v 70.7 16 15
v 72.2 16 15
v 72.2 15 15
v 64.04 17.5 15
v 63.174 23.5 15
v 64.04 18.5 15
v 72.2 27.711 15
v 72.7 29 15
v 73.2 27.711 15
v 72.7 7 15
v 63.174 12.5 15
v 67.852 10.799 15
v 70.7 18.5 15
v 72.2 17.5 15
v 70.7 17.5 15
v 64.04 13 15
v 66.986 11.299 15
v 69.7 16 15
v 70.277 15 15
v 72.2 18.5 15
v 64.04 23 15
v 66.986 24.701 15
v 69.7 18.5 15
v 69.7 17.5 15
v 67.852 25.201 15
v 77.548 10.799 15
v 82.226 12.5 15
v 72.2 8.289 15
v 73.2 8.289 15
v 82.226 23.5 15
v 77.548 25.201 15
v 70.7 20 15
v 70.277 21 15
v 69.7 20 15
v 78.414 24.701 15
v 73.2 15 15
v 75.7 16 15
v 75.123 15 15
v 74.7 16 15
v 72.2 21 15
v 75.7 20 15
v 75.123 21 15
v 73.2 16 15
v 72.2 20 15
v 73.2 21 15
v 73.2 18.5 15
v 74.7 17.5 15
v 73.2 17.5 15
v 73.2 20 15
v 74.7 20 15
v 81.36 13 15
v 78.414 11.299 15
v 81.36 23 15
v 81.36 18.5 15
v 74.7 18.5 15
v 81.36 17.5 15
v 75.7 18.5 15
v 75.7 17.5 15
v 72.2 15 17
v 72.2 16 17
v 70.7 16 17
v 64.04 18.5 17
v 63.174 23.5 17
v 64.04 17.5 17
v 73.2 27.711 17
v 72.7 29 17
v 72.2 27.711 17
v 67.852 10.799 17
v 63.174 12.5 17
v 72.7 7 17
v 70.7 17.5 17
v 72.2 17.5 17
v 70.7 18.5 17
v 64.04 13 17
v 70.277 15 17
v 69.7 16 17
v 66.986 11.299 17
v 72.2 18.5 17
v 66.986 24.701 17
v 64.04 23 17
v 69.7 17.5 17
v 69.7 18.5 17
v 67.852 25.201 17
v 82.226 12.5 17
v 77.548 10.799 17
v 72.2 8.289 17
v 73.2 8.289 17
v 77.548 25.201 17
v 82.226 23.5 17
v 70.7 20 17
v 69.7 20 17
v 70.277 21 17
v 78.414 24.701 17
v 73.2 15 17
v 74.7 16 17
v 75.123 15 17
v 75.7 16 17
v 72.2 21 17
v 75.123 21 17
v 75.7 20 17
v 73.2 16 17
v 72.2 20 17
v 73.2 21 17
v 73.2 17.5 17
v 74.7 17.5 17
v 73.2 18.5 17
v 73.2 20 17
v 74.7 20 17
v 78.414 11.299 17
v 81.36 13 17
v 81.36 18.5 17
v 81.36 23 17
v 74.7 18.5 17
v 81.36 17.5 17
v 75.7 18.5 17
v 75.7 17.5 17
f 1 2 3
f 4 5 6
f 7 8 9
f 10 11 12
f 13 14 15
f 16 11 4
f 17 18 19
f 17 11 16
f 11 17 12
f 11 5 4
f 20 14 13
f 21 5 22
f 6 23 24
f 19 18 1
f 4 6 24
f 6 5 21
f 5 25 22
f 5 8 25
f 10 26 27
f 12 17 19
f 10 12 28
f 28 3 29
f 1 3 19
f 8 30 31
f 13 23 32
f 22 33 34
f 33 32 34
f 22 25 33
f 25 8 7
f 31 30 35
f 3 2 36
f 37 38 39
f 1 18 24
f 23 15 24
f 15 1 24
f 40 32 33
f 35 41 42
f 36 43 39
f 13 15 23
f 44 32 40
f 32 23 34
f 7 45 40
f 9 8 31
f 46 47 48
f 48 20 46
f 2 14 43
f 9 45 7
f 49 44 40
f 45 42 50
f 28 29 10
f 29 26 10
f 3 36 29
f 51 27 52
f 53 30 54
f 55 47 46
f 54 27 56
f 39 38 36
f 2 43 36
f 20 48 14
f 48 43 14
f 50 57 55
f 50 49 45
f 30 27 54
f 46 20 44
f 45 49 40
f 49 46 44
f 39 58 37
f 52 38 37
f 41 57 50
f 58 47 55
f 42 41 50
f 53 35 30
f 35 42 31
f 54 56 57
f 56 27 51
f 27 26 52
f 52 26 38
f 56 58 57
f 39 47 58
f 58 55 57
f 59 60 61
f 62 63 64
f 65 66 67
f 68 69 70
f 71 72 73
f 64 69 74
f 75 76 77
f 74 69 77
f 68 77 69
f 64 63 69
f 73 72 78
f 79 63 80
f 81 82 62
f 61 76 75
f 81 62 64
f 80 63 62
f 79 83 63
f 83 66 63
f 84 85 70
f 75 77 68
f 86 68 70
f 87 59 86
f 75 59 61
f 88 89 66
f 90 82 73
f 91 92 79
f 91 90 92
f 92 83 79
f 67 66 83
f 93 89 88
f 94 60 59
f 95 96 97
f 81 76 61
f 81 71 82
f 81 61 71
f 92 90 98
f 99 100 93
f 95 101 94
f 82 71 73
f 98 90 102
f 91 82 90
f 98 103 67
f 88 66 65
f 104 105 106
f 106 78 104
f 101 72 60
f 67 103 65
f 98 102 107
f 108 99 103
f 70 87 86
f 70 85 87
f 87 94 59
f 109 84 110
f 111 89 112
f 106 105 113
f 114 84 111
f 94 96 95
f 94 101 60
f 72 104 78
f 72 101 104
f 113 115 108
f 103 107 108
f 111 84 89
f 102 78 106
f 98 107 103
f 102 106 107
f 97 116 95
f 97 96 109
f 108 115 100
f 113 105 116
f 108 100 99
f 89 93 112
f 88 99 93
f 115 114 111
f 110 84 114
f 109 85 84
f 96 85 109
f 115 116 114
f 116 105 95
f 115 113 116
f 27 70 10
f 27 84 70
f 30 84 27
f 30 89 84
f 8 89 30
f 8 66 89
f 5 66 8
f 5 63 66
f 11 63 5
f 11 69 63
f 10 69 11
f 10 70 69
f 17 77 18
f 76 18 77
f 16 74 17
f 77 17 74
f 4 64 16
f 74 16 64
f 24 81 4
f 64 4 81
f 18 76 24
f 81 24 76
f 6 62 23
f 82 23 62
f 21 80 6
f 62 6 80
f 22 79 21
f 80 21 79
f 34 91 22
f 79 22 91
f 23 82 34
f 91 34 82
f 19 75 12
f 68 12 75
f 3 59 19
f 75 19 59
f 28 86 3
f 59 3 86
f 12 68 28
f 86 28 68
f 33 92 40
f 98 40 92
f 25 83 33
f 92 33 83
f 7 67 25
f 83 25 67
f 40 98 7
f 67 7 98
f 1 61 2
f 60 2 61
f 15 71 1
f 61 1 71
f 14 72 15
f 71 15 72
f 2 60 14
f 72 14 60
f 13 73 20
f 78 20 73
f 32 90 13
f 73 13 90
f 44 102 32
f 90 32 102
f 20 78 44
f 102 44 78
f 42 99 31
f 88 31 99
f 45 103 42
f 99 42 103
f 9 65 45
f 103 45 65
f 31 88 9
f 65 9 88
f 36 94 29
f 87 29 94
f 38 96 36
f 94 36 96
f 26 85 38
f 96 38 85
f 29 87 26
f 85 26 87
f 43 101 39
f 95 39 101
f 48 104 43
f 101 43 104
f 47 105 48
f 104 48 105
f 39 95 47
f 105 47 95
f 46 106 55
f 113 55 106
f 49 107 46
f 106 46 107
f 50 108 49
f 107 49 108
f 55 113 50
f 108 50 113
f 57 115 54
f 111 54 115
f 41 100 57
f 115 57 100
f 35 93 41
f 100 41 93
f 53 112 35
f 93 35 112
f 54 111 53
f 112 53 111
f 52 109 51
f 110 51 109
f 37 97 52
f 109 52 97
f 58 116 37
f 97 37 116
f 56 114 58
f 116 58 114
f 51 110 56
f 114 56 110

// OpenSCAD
hex_width = 12;
hex_x_count = 4;
hex_y_count = 4;
hex_wall = 1;
hex_height = 2;

insert_width = hex_width - hex_wall;
insert_line = 1;

led_list_w = 10;

frame_width = 2;
frame_height = hex_height * 4 + led_list_w;



module hex_grid(size, count_x, count_y, wall, solid=false) {
    // Calculate geometric spacing for "Pointy Top" hexagons (rotate(90))
    // Horizontal spacing (flat-to-flat distance): sqrt(3) * radius
    spacing_x = sqrt(3) * size; 
    
    // Vertical spacing (3/2 * radius for nesting)
    spacing_y = size * 1.5; 

    for (x = [0 : count_x], y = [0 : count_y]) {
            // Apply offset: Odd rows shift right by half the X spacing
      if (!((y % 2 == 1) && (x == count_x))) {
            x_pos = (x * spacing_x) + ((y % 2) * (spacing_x / 2));
            y_pos = y * spacing_y;

            translate([x_pos, y_pos, 0])
            rotate(90)
                difference() {
                    // Changed to 'r' syntax for cleaner reading, mathematically identical to your 'd'
                    circle(r = size, $fn = 6);
                    if (!solid) {
                      circle(r = size - wall, $fn = 6);
                    }
                }
      }
    }
}

module hex_frame(size, count_x, count_y, wall) {
    // Calculate geometric spacing for "Pointy Top" hexagons (rotate(90))
    // Horizontal spacing (flat-to-flat distance): sqrt(3) * radius
color("gray")
  linear_extrude(height=frame_height) {
    difference() {
      offset(r=2, chamfer=false) {
        hex_grid(size=size, count_x=count_x, count_y=count_y, wall=wall, solid=true);     
      }
      hex_grid(size=size, count_x=count_x, count_y=count_y, wall=wall, solid=true);
    }
  }
  // top lip
  color("lightgray")
  translate([0,0,frame_height-hex_height]) {
    linear_extrude(height=hex_height) {
      difference() {
        hex_grid(size=size, count_x=count_x, count_y=count_y, wall=wall, solid=true); 
        offset(r=-2, chamfer=false) {
          hex_grid(size=size, count_x=count_x, count_y=count_y, wall=wall, solid=true);   
        }
      }
    }
  }

  // middle lip
  color("lightgray")
  translate([0,0,frame_height-hex_height*3]) {
    linear_extrude(height=hex_height) {
      difference() {
        hex_grid(size=size, count_x=count_x, count_y=count_y, wall=wall, solid=true); 
        offset(r=-1, chamfer=false) {
          hex_grid(size=size, count_x=count_x, count_y=count_y, wall=wall, solid=true);    
        }
      }
    }
  }

  // bottom lip
  color("darkgray")
  translate([0,0,0.0]) {
    linear_extrude(height=hex_height) {
      difference() {
        hex_grid(size=size, count_x=count_x, count_y=count_y, wall=wall, solid=true); 
        offset(r=-5, chamfer=false) {
          hex_grid(size=size, count_x=count_x, count_y=count_y, wall=wall, solid=true);    
        }
      }
    }
  }
}

module hex_insert_frame(size, wall, line) {
  difference() {
    circle(r = size, $fn = 6);
    circle(r = size - wall, $fn = 6);
  }
}

module hex_insert_star(size, wall, line) {
  hex_insert_frame(size=size, wall=wall, line=line);
  difference() {
    circle(r = size, $fn = 3);
    circle(r = size - line, $fn = 3);
  }
  rotate(180)
  difference() {
    circle(r = size, $fn = 3);
    circle(r = size - line, $fn = 3);
  }
}

module hex_insert_seigaiha(size, wall, line) {
  color("green")
  hex_insert_frame(size=size, wall=wall, line=line);

  color("green")
  intersection() {
    rotate(90)
    union() {
    for (i = [0:1.3:15]) {
      translate([0,i,0])
      difference() {
        circle(r = size-i);
        circle(r = size-i-line);
      }
    }
    translate([0,size/2])
    circle(r = size-5.5);
    }
    circle(r = size, $fn = 6);
  }
}

module hex_insert_shippo(size, wall, line) {
    color("red")
    hex_insert_frame(size=size, wall=wall, line=line);

    color("green")
      difference() {
        circle(r = (sqrt(3)/2)*size-line*2);
        circle(r = ((sqrt(3)/2)*size)-line*3);
    }
    color("green")
    intersection() {
      union() {
        for (i = [-(size/2+(size-line)/2),(size/2+(size-line)/2)],
        j = [-(size/2+(size-line)/2),(size/2+(size-line)/2)]) {
          translate([i,j,0])
          difference() {
            circle(r = size);
            circle(r = size-line);
          }
        }
      }
      circle(r = size, $fn = 6);
    }
}

module hex_insert_shokko(size, wall, line) {
    color("red")
    hex_insert_frame(size=size, wall=wall, line=line);
    inner_square = 6;
    color("green")
      intersection() {

        union() {
          difference() {
            square(inner_square, center=true);
            square(inner_square-line*2, center=true);
          }
          square([line,(sqrt(3)/2*size)*2], center=true);
          square([size*2,line], center=true);
          difference() {
            union() {
              union() {
                translate([-inner_square/2,inner_square/2,0])
                rotate(60)
                translate([-line/2,-line,0])
                square([line, size]);

                translate([inner_square/2,inner_square/2,0])
                rotate(-60)
                translate([-line/2,-line,0])
                square([line, size]);
              }
              mirror([0,1,0]) {
              union() {
                translate([-inner_square/2,inner_square/2,0])
                rotate(60)
                translate([-line/2,-line,0])
                square([line, size]);

                translate([inner_square/2,inner_square/2,0])
                rotate(-60)
                translate([-line/2,-line,0])
                square([line, size]);
              }
            }
            }
            square(inner_square, center=true);
          }
        }
      circle(r=size, $fn = 6);
      }
}


module main() {
  // 1. Create hexagonal grid

  // color("white")
  // translate([0,0,frame_height-hex_wall*3])
  // linear_extrude(height=hex_height) {
  //   hex_grid(size=hex_width, count_x=hex_x_count, count_y=hex_y_count, wall=hex_wall);
  // }

  // 2. Create frame surrounding the outside hexagonal grid
  // - frame should have screw holes
  // - frame should have space for led list insert

  // hex_frame(size=hex_width, count_x=hex_x_count, count_y=hex_y_count, wall=hex_wall);

  // 3. Create hexagonal inserts
  // - Atleast:
  //      - One light, one medium, one dark
  // color("purple")
  // translate([0,0,frame_height-hex_wall*3])
  // linear_extrude(height=hex_height) {
  //   translate([31,18,0])
  //   rotate(90)
  //   hex_insert_seigaiha(size=insert_width, wall=hex_wall, line=insert_line);
  // }

  // color("pink")
  // translate([0,0,frame_height-hex_wall*3])
  // linear_extrude(height=hex_height) {
  //   translate([31+21,18,0])
  //   rotate(90)
  //   hex_insert_shippo(size=insert_width, wall=hex_wall, line=insert_line);
  // }

  color("red")
  translate([0,0,frame_height-hex_wall*3])
  linear_extrude(height=hex_height) {
    translate([31+21*2-0.3,18,0])
    rotate(90)
    hex_insert_shokko(size=insert_width, wall=hex_wall, line=insert_line);
  }
}

main();
